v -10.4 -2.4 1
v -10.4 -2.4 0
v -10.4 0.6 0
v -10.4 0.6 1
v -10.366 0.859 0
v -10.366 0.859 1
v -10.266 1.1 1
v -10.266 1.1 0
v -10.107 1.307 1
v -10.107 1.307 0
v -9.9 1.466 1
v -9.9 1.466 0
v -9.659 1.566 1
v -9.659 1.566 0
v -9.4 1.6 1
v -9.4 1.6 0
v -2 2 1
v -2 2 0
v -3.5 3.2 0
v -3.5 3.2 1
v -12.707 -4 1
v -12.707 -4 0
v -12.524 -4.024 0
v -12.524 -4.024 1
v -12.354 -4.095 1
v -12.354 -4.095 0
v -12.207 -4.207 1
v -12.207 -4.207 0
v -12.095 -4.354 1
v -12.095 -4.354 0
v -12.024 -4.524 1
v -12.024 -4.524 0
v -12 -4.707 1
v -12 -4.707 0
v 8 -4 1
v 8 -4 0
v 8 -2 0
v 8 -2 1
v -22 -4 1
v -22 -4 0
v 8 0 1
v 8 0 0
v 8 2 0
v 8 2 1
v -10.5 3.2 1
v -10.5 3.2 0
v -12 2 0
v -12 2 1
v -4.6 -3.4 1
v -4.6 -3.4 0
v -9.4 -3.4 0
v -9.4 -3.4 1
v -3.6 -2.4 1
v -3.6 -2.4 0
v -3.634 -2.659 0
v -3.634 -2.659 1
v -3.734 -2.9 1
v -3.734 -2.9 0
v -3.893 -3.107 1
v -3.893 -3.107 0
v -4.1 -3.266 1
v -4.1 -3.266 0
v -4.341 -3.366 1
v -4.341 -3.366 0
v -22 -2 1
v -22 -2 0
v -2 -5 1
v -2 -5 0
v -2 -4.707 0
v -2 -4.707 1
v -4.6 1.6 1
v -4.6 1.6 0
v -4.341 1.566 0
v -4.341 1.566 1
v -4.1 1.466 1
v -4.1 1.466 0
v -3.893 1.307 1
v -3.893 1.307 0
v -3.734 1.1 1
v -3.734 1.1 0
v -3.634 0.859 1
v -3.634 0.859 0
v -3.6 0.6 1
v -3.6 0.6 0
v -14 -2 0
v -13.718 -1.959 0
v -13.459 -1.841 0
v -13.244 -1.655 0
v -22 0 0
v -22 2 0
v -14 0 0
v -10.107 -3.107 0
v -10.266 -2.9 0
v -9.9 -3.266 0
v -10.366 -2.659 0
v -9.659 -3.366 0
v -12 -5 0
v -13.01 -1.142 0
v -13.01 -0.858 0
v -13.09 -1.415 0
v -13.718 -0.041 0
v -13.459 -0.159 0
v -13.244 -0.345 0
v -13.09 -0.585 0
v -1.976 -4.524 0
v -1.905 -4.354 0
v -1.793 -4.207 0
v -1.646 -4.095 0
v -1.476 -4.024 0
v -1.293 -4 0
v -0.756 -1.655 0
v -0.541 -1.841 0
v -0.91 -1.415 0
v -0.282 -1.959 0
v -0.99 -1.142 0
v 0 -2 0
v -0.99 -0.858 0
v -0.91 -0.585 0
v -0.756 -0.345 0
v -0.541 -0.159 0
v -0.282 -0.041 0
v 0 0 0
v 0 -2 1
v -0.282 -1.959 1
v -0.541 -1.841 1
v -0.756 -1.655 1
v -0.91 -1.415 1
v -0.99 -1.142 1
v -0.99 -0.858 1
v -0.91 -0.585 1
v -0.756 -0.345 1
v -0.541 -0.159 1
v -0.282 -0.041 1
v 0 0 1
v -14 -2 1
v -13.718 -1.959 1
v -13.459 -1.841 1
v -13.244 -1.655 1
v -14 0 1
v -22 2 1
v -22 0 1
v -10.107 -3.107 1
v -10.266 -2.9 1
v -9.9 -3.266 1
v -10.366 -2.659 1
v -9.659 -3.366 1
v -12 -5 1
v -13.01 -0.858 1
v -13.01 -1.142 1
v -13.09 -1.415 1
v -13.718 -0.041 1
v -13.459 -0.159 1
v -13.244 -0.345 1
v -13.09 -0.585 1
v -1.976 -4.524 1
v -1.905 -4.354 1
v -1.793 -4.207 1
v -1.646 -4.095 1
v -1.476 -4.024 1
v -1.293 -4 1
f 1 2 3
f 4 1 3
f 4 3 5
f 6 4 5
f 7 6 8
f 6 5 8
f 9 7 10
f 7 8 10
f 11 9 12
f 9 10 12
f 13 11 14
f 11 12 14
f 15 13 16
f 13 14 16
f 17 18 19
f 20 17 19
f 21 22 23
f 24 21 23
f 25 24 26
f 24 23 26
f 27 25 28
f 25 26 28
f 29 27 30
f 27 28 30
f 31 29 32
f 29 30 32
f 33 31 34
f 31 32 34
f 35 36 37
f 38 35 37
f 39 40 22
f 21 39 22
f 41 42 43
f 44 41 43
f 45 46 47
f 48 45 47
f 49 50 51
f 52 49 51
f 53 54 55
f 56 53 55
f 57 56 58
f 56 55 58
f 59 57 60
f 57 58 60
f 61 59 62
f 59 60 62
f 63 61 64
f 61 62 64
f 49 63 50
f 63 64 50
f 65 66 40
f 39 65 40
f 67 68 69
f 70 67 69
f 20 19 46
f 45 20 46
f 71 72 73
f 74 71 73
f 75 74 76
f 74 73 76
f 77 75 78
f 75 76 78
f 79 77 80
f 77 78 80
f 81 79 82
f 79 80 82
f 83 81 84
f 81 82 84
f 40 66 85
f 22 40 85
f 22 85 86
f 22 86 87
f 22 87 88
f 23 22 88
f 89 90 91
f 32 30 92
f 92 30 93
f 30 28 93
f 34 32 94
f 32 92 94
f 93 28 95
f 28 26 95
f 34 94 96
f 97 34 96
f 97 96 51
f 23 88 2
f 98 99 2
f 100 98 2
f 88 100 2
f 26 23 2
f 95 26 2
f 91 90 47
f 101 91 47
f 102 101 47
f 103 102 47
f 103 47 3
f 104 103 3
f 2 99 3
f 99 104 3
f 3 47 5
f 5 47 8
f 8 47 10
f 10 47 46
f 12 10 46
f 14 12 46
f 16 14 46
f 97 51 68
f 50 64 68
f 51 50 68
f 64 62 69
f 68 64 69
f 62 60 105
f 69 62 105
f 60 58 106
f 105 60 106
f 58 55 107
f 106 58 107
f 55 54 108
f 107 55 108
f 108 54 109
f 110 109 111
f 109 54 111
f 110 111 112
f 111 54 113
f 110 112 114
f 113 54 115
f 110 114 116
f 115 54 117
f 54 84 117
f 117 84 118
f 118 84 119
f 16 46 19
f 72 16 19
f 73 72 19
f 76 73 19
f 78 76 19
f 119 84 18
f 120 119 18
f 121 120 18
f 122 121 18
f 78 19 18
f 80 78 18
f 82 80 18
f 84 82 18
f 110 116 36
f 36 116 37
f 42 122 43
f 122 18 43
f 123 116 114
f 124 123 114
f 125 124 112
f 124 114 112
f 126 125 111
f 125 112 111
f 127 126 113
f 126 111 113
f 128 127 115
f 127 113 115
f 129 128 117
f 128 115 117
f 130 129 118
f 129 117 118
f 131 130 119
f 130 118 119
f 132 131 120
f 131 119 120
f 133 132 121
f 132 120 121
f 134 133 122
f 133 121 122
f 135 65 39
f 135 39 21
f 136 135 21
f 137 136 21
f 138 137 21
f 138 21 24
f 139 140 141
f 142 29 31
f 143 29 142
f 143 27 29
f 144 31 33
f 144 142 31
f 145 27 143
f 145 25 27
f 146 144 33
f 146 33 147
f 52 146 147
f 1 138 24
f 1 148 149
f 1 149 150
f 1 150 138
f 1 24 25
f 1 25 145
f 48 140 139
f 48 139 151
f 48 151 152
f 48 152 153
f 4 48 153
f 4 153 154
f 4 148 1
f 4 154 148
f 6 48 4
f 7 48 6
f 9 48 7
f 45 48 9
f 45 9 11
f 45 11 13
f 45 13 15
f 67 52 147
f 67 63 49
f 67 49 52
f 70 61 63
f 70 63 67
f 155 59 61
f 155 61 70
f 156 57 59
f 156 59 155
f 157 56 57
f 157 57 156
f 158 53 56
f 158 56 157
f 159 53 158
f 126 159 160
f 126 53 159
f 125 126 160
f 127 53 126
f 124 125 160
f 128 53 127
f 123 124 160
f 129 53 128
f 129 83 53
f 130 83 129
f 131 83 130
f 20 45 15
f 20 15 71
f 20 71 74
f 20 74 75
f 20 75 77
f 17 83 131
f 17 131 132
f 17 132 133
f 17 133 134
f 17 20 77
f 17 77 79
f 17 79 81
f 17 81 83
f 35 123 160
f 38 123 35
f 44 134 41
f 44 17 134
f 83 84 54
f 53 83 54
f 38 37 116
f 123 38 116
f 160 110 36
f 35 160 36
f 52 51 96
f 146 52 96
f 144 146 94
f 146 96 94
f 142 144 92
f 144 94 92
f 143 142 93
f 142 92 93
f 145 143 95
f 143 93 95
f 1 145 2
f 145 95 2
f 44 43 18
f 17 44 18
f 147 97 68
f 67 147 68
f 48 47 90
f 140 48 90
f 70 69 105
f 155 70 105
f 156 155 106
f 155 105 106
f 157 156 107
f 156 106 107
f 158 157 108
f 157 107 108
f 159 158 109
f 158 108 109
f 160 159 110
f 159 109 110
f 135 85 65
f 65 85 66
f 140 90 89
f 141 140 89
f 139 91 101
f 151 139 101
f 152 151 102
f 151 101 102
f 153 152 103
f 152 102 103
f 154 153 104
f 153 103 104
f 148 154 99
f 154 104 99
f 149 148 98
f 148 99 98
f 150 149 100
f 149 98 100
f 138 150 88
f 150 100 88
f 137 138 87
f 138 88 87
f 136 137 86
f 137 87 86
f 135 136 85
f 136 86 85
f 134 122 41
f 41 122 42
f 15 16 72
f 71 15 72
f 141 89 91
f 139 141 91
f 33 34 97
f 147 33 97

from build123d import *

# Parameters (mm, degrees)
F1_DEPTH = 1


with BuildPart() as f1:
    # F0 (on Top) → F1 (new body)
    with BuildSketch(Plane.XY):
        with BuildLine():
            ThreePointArc((0, -2), (-1, -1), (0, 0))
            Line((0, 0), (8, 0))
            Line((8, 0), (8, 2))
            Line((8, 2), (-2, 2))
            Line((-2, 2), (-3.5, 3.2))
            Line((-3.5, 3.2), (-10.5, 3.2))
            Line((-10.5, 3.2), (-12, 2))
            Line((-12, 2), (-22, 2))
            Line((-22, 2), (-22, 0))
            Line((-22, 0), (-14, 0))
            ThreePointArc((-14, 0), (-13, -1), (-14, -2))
            Line((-14, -2), (-22, -2))
            Line((-22, -2), (-22, -4))
            Line((-22, -4), (-12.707107, -4))
            ThreePointArc((-12.707107, -4), (-12.207107, -4.207107), (-12, -4.707107))
            Line((-12, -4.707107), (-12, -5))
            Line((-12, -5), (-2, -5))
            Line((-2, -5), (-2, -4.707107))
            ThreePointArc((-2, -4.707107), (-1.792893, -4.207107), (-1.292893, -4))
            Line((-1.292893, -4), (8, -4))
            Line((8, -4), (8, -2))
            Line((8, -2), (0, -2))
        make_face()
        with BuildLine():
            Line((-4.6, -3.4), (-9.4, -3.4))
            ThreePointArc((-9.4, -3.4), (-10.107107, -3.107107), (-10.4, -2.4))
            Line((-10.4, -2.4), (-10.4, 0.6))
            ThreePointArc((-10.4, 0.6), (-10.107107, 1.307107), (-9.4, 1.6))
            Line((-9.4, 1.6), (-4.6, 1.6))
            ThreePointArc((-4.6, 1.6), (-3.892893, 1.307107), (-3.6, 0.6))
            Line((-3.6, 0.6), (-3.6, -2.4))
            ThreePointArc((-3.6, -2.4), (-3.892893, -3.107107), (-4.6, -3.4))
        make_face(mode=Mode.SUBTRACT)
    extrude(amount=F1_DEPTH)


solid = f1.part
